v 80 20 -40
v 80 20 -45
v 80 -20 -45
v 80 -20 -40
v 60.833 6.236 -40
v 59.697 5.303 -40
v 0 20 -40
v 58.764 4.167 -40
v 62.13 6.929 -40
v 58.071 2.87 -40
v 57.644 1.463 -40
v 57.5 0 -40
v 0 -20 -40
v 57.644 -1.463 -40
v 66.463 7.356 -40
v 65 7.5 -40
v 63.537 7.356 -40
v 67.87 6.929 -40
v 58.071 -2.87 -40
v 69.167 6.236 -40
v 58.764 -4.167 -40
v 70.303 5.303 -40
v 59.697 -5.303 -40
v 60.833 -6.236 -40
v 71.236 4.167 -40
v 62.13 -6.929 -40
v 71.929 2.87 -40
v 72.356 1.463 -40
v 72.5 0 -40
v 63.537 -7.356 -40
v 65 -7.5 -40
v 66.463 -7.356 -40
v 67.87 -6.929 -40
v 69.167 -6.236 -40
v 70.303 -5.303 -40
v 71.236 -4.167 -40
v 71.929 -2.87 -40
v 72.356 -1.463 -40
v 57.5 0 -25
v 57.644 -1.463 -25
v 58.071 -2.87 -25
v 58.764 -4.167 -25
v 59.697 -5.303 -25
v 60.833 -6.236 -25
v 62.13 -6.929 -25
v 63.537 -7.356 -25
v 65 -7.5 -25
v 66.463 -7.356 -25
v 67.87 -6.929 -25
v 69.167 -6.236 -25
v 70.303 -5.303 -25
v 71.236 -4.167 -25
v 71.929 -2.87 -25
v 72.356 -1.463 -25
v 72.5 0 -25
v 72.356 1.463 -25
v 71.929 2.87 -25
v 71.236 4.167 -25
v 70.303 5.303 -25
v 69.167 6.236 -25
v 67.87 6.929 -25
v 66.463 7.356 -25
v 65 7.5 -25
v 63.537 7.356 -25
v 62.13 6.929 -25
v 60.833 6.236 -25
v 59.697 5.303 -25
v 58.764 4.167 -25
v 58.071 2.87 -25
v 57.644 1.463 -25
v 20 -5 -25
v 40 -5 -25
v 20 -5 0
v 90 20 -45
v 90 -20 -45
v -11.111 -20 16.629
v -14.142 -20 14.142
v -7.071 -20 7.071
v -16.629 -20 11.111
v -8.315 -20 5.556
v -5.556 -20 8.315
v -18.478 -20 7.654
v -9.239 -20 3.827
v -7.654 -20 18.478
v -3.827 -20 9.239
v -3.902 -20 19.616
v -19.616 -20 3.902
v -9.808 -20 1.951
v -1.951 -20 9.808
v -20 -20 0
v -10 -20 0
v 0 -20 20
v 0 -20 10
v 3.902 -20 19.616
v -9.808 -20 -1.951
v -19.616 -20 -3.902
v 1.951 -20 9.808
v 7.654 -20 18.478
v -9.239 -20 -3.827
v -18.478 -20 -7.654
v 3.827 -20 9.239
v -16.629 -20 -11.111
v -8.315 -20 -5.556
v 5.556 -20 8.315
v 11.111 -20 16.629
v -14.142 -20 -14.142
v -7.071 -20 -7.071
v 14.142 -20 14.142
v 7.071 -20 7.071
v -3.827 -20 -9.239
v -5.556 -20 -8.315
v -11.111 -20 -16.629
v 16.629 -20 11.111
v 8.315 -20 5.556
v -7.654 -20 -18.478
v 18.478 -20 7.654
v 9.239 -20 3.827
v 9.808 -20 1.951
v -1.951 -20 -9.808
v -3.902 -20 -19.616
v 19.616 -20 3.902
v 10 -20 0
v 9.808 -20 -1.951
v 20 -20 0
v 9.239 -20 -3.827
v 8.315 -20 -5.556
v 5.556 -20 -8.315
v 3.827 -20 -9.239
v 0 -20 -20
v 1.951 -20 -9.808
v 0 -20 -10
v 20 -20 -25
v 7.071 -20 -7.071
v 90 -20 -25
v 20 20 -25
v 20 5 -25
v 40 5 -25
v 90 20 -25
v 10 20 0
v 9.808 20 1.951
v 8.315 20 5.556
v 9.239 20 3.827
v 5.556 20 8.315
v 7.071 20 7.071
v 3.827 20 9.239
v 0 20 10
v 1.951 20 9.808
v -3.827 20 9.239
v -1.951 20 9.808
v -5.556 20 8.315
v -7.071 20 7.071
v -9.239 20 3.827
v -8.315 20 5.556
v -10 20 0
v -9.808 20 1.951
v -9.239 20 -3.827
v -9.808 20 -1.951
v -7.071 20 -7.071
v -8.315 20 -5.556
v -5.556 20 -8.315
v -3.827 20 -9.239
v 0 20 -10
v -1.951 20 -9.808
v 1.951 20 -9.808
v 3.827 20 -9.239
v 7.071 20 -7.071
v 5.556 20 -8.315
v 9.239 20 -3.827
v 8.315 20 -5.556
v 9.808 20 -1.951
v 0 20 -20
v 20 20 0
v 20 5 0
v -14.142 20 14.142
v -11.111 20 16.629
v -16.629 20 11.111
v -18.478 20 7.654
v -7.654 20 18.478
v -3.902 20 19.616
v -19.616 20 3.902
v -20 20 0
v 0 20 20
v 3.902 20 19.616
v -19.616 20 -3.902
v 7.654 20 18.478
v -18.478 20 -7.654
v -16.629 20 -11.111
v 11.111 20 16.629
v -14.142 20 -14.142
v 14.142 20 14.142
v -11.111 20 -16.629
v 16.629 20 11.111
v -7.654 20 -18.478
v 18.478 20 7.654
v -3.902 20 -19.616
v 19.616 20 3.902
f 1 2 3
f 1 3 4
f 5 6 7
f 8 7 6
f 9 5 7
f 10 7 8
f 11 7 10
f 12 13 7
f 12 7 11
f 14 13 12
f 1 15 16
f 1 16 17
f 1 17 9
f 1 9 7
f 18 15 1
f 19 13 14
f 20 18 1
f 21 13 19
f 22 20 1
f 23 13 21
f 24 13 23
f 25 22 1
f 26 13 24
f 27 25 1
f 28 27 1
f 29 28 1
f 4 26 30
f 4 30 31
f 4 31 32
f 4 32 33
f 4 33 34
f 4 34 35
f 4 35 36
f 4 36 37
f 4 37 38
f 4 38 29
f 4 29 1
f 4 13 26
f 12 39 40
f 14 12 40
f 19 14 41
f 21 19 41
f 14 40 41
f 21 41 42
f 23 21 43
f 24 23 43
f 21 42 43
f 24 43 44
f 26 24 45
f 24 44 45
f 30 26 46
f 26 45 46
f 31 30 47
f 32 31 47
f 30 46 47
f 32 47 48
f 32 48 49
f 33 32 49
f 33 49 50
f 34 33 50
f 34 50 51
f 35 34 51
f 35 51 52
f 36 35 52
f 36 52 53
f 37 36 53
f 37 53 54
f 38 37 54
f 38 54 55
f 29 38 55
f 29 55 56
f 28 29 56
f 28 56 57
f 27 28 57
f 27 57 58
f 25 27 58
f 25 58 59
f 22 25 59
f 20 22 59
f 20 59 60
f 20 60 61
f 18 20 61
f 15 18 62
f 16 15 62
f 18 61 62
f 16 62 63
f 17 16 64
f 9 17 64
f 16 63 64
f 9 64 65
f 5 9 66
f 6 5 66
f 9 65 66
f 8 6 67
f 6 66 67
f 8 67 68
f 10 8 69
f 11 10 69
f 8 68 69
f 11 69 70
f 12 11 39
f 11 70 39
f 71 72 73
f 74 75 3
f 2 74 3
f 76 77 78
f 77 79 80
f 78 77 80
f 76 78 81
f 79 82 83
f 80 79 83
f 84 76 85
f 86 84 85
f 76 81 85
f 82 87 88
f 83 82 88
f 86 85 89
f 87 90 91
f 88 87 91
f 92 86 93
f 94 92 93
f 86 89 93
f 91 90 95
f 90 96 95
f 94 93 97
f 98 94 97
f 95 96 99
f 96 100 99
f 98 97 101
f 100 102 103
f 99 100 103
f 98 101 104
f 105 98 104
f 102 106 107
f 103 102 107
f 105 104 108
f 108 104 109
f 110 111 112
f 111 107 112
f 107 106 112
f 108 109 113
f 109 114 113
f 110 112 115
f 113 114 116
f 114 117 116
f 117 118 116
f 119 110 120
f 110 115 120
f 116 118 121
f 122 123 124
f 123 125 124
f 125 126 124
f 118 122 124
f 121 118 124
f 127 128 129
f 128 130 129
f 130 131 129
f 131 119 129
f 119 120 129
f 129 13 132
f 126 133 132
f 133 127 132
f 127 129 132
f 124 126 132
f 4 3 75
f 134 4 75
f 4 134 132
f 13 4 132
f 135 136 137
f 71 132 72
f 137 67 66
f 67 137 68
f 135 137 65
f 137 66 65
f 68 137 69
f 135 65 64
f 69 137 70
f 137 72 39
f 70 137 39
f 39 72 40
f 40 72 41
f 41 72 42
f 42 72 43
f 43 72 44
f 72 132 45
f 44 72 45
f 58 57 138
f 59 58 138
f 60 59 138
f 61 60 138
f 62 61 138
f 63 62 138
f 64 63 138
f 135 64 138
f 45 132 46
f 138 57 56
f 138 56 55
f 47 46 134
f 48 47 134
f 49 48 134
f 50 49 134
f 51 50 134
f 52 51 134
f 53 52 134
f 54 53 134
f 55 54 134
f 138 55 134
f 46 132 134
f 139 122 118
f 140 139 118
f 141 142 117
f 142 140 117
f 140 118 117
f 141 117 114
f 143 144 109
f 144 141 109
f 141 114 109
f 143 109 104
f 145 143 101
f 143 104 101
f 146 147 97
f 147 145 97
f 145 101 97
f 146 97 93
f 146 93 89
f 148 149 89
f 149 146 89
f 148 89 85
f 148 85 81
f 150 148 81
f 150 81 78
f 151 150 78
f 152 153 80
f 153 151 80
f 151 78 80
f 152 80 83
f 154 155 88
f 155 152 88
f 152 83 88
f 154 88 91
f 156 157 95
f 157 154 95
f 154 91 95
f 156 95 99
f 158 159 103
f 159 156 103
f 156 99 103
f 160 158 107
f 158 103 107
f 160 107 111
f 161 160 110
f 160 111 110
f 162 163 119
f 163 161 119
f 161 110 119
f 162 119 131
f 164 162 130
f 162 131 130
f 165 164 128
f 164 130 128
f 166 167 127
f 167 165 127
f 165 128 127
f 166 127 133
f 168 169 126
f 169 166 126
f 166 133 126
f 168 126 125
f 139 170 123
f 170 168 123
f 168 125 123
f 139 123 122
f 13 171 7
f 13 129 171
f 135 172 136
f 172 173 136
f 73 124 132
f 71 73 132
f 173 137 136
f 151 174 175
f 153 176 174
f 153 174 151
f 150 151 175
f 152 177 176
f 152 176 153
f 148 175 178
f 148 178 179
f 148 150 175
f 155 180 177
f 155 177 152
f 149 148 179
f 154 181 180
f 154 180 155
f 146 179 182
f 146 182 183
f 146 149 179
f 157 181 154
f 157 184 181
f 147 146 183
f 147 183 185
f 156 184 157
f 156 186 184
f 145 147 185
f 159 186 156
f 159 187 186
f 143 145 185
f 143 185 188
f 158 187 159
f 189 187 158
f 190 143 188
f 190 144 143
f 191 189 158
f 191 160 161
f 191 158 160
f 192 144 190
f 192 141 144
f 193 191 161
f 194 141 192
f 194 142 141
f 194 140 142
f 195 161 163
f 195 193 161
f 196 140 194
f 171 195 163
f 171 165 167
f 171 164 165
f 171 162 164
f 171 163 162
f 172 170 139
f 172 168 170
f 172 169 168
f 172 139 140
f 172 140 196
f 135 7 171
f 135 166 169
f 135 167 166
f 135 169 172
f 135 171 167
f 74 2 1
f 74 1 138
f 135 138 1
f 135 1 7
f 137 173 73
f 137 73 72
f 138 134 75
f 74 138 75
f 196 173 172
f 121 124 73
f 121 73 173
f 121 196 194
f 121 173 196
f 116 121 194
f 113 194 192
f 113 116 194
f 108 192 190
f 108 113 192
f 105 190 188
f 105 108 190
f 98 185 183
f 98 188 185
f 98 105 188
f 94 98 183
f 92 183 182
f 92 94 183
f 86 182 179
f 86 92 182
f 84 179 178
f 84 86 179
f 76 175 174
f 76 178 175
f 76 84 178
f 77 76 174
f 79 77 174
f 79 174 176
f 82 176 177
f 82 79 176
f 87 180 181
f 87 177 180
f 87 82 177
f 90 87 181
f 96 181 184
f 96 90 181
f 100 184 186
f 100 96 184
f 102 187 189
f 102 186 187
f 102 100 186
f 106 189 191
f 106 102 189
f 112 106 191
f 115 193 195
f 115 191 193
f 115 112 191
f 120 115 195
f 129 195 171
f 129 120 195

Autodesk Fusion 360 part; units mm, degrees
sketch "Sketch1" plane through (0, 0, 0) normal (0, 1, 0) x (1, 0, 0)
  circle A0 centre (0, 0) radius 10
  line L0 (0, 40) -> (80, 40)
  line L1 (20, 0) -> (20, 25)
  line L2 (20, 25) -> (80, 25)
  arc A1 (0, 20) -> (20, 0) centre (0, 0) ccw
  line L3 (80, 25) -> (90, 25)
  line L4 (90, 25) -> (90, 45)
  line L5 (90, 45) -> (80, 45)
  line L6 (80, 45) -> (80, 40)
  line L7 (0, 20) -> (0, 40)
  dimension "d1" = 20
  dimension "d2" = 40
  dimension "d3" = 40
  dimension "d4" = 80
  dimension "d5" = 15
  dimension "d6" = 5
  dimension "d7" = 10
extrude "Extrude1" add sketch "Sketch1" along normal mid plane 40
sketch "Sketch2" plane through (0, 0, 0) normal (0, 1, 0) x (1, 0, 0)
sketch "Sketch3" plane through (0, 0, -25) normal (0, 0, 1) x (-1, 0, 0)
  line L0 (-90, 20) -> (-90, -20)
  line L1 (-90, -20) -> (-20, -20)
  line L2 (-20, -20) -> (-20, 20)
  line L3 (-20, 20) -> (-90, 20)
  circle A0 centre (-65, 0) radius 7.5
  dimension "d10" = 15
  dimension "d11" = 25
  dimension "d12" = 20
extrude "Extrude2" cut sketch "Sketch3" against normal blind 40 contours A0
ref_plane "WorkPlane1" through (35, 0, -12.5) normal (0, -1, 0) x (-1, 0, 0)
sketch "Sketch4" plane through (0, 0, 0) normal (0, -1, 0) x (-1, 0, 0)
  line L0 (-20, 0) -> (-40, 25)
  line L1 (-20, 0) -> (-20, 25)
  line L2 (-20, 25) -> (-40, 25)
extrude "Extrude3" add sketch "Sketch4" along normal mid plane 10
